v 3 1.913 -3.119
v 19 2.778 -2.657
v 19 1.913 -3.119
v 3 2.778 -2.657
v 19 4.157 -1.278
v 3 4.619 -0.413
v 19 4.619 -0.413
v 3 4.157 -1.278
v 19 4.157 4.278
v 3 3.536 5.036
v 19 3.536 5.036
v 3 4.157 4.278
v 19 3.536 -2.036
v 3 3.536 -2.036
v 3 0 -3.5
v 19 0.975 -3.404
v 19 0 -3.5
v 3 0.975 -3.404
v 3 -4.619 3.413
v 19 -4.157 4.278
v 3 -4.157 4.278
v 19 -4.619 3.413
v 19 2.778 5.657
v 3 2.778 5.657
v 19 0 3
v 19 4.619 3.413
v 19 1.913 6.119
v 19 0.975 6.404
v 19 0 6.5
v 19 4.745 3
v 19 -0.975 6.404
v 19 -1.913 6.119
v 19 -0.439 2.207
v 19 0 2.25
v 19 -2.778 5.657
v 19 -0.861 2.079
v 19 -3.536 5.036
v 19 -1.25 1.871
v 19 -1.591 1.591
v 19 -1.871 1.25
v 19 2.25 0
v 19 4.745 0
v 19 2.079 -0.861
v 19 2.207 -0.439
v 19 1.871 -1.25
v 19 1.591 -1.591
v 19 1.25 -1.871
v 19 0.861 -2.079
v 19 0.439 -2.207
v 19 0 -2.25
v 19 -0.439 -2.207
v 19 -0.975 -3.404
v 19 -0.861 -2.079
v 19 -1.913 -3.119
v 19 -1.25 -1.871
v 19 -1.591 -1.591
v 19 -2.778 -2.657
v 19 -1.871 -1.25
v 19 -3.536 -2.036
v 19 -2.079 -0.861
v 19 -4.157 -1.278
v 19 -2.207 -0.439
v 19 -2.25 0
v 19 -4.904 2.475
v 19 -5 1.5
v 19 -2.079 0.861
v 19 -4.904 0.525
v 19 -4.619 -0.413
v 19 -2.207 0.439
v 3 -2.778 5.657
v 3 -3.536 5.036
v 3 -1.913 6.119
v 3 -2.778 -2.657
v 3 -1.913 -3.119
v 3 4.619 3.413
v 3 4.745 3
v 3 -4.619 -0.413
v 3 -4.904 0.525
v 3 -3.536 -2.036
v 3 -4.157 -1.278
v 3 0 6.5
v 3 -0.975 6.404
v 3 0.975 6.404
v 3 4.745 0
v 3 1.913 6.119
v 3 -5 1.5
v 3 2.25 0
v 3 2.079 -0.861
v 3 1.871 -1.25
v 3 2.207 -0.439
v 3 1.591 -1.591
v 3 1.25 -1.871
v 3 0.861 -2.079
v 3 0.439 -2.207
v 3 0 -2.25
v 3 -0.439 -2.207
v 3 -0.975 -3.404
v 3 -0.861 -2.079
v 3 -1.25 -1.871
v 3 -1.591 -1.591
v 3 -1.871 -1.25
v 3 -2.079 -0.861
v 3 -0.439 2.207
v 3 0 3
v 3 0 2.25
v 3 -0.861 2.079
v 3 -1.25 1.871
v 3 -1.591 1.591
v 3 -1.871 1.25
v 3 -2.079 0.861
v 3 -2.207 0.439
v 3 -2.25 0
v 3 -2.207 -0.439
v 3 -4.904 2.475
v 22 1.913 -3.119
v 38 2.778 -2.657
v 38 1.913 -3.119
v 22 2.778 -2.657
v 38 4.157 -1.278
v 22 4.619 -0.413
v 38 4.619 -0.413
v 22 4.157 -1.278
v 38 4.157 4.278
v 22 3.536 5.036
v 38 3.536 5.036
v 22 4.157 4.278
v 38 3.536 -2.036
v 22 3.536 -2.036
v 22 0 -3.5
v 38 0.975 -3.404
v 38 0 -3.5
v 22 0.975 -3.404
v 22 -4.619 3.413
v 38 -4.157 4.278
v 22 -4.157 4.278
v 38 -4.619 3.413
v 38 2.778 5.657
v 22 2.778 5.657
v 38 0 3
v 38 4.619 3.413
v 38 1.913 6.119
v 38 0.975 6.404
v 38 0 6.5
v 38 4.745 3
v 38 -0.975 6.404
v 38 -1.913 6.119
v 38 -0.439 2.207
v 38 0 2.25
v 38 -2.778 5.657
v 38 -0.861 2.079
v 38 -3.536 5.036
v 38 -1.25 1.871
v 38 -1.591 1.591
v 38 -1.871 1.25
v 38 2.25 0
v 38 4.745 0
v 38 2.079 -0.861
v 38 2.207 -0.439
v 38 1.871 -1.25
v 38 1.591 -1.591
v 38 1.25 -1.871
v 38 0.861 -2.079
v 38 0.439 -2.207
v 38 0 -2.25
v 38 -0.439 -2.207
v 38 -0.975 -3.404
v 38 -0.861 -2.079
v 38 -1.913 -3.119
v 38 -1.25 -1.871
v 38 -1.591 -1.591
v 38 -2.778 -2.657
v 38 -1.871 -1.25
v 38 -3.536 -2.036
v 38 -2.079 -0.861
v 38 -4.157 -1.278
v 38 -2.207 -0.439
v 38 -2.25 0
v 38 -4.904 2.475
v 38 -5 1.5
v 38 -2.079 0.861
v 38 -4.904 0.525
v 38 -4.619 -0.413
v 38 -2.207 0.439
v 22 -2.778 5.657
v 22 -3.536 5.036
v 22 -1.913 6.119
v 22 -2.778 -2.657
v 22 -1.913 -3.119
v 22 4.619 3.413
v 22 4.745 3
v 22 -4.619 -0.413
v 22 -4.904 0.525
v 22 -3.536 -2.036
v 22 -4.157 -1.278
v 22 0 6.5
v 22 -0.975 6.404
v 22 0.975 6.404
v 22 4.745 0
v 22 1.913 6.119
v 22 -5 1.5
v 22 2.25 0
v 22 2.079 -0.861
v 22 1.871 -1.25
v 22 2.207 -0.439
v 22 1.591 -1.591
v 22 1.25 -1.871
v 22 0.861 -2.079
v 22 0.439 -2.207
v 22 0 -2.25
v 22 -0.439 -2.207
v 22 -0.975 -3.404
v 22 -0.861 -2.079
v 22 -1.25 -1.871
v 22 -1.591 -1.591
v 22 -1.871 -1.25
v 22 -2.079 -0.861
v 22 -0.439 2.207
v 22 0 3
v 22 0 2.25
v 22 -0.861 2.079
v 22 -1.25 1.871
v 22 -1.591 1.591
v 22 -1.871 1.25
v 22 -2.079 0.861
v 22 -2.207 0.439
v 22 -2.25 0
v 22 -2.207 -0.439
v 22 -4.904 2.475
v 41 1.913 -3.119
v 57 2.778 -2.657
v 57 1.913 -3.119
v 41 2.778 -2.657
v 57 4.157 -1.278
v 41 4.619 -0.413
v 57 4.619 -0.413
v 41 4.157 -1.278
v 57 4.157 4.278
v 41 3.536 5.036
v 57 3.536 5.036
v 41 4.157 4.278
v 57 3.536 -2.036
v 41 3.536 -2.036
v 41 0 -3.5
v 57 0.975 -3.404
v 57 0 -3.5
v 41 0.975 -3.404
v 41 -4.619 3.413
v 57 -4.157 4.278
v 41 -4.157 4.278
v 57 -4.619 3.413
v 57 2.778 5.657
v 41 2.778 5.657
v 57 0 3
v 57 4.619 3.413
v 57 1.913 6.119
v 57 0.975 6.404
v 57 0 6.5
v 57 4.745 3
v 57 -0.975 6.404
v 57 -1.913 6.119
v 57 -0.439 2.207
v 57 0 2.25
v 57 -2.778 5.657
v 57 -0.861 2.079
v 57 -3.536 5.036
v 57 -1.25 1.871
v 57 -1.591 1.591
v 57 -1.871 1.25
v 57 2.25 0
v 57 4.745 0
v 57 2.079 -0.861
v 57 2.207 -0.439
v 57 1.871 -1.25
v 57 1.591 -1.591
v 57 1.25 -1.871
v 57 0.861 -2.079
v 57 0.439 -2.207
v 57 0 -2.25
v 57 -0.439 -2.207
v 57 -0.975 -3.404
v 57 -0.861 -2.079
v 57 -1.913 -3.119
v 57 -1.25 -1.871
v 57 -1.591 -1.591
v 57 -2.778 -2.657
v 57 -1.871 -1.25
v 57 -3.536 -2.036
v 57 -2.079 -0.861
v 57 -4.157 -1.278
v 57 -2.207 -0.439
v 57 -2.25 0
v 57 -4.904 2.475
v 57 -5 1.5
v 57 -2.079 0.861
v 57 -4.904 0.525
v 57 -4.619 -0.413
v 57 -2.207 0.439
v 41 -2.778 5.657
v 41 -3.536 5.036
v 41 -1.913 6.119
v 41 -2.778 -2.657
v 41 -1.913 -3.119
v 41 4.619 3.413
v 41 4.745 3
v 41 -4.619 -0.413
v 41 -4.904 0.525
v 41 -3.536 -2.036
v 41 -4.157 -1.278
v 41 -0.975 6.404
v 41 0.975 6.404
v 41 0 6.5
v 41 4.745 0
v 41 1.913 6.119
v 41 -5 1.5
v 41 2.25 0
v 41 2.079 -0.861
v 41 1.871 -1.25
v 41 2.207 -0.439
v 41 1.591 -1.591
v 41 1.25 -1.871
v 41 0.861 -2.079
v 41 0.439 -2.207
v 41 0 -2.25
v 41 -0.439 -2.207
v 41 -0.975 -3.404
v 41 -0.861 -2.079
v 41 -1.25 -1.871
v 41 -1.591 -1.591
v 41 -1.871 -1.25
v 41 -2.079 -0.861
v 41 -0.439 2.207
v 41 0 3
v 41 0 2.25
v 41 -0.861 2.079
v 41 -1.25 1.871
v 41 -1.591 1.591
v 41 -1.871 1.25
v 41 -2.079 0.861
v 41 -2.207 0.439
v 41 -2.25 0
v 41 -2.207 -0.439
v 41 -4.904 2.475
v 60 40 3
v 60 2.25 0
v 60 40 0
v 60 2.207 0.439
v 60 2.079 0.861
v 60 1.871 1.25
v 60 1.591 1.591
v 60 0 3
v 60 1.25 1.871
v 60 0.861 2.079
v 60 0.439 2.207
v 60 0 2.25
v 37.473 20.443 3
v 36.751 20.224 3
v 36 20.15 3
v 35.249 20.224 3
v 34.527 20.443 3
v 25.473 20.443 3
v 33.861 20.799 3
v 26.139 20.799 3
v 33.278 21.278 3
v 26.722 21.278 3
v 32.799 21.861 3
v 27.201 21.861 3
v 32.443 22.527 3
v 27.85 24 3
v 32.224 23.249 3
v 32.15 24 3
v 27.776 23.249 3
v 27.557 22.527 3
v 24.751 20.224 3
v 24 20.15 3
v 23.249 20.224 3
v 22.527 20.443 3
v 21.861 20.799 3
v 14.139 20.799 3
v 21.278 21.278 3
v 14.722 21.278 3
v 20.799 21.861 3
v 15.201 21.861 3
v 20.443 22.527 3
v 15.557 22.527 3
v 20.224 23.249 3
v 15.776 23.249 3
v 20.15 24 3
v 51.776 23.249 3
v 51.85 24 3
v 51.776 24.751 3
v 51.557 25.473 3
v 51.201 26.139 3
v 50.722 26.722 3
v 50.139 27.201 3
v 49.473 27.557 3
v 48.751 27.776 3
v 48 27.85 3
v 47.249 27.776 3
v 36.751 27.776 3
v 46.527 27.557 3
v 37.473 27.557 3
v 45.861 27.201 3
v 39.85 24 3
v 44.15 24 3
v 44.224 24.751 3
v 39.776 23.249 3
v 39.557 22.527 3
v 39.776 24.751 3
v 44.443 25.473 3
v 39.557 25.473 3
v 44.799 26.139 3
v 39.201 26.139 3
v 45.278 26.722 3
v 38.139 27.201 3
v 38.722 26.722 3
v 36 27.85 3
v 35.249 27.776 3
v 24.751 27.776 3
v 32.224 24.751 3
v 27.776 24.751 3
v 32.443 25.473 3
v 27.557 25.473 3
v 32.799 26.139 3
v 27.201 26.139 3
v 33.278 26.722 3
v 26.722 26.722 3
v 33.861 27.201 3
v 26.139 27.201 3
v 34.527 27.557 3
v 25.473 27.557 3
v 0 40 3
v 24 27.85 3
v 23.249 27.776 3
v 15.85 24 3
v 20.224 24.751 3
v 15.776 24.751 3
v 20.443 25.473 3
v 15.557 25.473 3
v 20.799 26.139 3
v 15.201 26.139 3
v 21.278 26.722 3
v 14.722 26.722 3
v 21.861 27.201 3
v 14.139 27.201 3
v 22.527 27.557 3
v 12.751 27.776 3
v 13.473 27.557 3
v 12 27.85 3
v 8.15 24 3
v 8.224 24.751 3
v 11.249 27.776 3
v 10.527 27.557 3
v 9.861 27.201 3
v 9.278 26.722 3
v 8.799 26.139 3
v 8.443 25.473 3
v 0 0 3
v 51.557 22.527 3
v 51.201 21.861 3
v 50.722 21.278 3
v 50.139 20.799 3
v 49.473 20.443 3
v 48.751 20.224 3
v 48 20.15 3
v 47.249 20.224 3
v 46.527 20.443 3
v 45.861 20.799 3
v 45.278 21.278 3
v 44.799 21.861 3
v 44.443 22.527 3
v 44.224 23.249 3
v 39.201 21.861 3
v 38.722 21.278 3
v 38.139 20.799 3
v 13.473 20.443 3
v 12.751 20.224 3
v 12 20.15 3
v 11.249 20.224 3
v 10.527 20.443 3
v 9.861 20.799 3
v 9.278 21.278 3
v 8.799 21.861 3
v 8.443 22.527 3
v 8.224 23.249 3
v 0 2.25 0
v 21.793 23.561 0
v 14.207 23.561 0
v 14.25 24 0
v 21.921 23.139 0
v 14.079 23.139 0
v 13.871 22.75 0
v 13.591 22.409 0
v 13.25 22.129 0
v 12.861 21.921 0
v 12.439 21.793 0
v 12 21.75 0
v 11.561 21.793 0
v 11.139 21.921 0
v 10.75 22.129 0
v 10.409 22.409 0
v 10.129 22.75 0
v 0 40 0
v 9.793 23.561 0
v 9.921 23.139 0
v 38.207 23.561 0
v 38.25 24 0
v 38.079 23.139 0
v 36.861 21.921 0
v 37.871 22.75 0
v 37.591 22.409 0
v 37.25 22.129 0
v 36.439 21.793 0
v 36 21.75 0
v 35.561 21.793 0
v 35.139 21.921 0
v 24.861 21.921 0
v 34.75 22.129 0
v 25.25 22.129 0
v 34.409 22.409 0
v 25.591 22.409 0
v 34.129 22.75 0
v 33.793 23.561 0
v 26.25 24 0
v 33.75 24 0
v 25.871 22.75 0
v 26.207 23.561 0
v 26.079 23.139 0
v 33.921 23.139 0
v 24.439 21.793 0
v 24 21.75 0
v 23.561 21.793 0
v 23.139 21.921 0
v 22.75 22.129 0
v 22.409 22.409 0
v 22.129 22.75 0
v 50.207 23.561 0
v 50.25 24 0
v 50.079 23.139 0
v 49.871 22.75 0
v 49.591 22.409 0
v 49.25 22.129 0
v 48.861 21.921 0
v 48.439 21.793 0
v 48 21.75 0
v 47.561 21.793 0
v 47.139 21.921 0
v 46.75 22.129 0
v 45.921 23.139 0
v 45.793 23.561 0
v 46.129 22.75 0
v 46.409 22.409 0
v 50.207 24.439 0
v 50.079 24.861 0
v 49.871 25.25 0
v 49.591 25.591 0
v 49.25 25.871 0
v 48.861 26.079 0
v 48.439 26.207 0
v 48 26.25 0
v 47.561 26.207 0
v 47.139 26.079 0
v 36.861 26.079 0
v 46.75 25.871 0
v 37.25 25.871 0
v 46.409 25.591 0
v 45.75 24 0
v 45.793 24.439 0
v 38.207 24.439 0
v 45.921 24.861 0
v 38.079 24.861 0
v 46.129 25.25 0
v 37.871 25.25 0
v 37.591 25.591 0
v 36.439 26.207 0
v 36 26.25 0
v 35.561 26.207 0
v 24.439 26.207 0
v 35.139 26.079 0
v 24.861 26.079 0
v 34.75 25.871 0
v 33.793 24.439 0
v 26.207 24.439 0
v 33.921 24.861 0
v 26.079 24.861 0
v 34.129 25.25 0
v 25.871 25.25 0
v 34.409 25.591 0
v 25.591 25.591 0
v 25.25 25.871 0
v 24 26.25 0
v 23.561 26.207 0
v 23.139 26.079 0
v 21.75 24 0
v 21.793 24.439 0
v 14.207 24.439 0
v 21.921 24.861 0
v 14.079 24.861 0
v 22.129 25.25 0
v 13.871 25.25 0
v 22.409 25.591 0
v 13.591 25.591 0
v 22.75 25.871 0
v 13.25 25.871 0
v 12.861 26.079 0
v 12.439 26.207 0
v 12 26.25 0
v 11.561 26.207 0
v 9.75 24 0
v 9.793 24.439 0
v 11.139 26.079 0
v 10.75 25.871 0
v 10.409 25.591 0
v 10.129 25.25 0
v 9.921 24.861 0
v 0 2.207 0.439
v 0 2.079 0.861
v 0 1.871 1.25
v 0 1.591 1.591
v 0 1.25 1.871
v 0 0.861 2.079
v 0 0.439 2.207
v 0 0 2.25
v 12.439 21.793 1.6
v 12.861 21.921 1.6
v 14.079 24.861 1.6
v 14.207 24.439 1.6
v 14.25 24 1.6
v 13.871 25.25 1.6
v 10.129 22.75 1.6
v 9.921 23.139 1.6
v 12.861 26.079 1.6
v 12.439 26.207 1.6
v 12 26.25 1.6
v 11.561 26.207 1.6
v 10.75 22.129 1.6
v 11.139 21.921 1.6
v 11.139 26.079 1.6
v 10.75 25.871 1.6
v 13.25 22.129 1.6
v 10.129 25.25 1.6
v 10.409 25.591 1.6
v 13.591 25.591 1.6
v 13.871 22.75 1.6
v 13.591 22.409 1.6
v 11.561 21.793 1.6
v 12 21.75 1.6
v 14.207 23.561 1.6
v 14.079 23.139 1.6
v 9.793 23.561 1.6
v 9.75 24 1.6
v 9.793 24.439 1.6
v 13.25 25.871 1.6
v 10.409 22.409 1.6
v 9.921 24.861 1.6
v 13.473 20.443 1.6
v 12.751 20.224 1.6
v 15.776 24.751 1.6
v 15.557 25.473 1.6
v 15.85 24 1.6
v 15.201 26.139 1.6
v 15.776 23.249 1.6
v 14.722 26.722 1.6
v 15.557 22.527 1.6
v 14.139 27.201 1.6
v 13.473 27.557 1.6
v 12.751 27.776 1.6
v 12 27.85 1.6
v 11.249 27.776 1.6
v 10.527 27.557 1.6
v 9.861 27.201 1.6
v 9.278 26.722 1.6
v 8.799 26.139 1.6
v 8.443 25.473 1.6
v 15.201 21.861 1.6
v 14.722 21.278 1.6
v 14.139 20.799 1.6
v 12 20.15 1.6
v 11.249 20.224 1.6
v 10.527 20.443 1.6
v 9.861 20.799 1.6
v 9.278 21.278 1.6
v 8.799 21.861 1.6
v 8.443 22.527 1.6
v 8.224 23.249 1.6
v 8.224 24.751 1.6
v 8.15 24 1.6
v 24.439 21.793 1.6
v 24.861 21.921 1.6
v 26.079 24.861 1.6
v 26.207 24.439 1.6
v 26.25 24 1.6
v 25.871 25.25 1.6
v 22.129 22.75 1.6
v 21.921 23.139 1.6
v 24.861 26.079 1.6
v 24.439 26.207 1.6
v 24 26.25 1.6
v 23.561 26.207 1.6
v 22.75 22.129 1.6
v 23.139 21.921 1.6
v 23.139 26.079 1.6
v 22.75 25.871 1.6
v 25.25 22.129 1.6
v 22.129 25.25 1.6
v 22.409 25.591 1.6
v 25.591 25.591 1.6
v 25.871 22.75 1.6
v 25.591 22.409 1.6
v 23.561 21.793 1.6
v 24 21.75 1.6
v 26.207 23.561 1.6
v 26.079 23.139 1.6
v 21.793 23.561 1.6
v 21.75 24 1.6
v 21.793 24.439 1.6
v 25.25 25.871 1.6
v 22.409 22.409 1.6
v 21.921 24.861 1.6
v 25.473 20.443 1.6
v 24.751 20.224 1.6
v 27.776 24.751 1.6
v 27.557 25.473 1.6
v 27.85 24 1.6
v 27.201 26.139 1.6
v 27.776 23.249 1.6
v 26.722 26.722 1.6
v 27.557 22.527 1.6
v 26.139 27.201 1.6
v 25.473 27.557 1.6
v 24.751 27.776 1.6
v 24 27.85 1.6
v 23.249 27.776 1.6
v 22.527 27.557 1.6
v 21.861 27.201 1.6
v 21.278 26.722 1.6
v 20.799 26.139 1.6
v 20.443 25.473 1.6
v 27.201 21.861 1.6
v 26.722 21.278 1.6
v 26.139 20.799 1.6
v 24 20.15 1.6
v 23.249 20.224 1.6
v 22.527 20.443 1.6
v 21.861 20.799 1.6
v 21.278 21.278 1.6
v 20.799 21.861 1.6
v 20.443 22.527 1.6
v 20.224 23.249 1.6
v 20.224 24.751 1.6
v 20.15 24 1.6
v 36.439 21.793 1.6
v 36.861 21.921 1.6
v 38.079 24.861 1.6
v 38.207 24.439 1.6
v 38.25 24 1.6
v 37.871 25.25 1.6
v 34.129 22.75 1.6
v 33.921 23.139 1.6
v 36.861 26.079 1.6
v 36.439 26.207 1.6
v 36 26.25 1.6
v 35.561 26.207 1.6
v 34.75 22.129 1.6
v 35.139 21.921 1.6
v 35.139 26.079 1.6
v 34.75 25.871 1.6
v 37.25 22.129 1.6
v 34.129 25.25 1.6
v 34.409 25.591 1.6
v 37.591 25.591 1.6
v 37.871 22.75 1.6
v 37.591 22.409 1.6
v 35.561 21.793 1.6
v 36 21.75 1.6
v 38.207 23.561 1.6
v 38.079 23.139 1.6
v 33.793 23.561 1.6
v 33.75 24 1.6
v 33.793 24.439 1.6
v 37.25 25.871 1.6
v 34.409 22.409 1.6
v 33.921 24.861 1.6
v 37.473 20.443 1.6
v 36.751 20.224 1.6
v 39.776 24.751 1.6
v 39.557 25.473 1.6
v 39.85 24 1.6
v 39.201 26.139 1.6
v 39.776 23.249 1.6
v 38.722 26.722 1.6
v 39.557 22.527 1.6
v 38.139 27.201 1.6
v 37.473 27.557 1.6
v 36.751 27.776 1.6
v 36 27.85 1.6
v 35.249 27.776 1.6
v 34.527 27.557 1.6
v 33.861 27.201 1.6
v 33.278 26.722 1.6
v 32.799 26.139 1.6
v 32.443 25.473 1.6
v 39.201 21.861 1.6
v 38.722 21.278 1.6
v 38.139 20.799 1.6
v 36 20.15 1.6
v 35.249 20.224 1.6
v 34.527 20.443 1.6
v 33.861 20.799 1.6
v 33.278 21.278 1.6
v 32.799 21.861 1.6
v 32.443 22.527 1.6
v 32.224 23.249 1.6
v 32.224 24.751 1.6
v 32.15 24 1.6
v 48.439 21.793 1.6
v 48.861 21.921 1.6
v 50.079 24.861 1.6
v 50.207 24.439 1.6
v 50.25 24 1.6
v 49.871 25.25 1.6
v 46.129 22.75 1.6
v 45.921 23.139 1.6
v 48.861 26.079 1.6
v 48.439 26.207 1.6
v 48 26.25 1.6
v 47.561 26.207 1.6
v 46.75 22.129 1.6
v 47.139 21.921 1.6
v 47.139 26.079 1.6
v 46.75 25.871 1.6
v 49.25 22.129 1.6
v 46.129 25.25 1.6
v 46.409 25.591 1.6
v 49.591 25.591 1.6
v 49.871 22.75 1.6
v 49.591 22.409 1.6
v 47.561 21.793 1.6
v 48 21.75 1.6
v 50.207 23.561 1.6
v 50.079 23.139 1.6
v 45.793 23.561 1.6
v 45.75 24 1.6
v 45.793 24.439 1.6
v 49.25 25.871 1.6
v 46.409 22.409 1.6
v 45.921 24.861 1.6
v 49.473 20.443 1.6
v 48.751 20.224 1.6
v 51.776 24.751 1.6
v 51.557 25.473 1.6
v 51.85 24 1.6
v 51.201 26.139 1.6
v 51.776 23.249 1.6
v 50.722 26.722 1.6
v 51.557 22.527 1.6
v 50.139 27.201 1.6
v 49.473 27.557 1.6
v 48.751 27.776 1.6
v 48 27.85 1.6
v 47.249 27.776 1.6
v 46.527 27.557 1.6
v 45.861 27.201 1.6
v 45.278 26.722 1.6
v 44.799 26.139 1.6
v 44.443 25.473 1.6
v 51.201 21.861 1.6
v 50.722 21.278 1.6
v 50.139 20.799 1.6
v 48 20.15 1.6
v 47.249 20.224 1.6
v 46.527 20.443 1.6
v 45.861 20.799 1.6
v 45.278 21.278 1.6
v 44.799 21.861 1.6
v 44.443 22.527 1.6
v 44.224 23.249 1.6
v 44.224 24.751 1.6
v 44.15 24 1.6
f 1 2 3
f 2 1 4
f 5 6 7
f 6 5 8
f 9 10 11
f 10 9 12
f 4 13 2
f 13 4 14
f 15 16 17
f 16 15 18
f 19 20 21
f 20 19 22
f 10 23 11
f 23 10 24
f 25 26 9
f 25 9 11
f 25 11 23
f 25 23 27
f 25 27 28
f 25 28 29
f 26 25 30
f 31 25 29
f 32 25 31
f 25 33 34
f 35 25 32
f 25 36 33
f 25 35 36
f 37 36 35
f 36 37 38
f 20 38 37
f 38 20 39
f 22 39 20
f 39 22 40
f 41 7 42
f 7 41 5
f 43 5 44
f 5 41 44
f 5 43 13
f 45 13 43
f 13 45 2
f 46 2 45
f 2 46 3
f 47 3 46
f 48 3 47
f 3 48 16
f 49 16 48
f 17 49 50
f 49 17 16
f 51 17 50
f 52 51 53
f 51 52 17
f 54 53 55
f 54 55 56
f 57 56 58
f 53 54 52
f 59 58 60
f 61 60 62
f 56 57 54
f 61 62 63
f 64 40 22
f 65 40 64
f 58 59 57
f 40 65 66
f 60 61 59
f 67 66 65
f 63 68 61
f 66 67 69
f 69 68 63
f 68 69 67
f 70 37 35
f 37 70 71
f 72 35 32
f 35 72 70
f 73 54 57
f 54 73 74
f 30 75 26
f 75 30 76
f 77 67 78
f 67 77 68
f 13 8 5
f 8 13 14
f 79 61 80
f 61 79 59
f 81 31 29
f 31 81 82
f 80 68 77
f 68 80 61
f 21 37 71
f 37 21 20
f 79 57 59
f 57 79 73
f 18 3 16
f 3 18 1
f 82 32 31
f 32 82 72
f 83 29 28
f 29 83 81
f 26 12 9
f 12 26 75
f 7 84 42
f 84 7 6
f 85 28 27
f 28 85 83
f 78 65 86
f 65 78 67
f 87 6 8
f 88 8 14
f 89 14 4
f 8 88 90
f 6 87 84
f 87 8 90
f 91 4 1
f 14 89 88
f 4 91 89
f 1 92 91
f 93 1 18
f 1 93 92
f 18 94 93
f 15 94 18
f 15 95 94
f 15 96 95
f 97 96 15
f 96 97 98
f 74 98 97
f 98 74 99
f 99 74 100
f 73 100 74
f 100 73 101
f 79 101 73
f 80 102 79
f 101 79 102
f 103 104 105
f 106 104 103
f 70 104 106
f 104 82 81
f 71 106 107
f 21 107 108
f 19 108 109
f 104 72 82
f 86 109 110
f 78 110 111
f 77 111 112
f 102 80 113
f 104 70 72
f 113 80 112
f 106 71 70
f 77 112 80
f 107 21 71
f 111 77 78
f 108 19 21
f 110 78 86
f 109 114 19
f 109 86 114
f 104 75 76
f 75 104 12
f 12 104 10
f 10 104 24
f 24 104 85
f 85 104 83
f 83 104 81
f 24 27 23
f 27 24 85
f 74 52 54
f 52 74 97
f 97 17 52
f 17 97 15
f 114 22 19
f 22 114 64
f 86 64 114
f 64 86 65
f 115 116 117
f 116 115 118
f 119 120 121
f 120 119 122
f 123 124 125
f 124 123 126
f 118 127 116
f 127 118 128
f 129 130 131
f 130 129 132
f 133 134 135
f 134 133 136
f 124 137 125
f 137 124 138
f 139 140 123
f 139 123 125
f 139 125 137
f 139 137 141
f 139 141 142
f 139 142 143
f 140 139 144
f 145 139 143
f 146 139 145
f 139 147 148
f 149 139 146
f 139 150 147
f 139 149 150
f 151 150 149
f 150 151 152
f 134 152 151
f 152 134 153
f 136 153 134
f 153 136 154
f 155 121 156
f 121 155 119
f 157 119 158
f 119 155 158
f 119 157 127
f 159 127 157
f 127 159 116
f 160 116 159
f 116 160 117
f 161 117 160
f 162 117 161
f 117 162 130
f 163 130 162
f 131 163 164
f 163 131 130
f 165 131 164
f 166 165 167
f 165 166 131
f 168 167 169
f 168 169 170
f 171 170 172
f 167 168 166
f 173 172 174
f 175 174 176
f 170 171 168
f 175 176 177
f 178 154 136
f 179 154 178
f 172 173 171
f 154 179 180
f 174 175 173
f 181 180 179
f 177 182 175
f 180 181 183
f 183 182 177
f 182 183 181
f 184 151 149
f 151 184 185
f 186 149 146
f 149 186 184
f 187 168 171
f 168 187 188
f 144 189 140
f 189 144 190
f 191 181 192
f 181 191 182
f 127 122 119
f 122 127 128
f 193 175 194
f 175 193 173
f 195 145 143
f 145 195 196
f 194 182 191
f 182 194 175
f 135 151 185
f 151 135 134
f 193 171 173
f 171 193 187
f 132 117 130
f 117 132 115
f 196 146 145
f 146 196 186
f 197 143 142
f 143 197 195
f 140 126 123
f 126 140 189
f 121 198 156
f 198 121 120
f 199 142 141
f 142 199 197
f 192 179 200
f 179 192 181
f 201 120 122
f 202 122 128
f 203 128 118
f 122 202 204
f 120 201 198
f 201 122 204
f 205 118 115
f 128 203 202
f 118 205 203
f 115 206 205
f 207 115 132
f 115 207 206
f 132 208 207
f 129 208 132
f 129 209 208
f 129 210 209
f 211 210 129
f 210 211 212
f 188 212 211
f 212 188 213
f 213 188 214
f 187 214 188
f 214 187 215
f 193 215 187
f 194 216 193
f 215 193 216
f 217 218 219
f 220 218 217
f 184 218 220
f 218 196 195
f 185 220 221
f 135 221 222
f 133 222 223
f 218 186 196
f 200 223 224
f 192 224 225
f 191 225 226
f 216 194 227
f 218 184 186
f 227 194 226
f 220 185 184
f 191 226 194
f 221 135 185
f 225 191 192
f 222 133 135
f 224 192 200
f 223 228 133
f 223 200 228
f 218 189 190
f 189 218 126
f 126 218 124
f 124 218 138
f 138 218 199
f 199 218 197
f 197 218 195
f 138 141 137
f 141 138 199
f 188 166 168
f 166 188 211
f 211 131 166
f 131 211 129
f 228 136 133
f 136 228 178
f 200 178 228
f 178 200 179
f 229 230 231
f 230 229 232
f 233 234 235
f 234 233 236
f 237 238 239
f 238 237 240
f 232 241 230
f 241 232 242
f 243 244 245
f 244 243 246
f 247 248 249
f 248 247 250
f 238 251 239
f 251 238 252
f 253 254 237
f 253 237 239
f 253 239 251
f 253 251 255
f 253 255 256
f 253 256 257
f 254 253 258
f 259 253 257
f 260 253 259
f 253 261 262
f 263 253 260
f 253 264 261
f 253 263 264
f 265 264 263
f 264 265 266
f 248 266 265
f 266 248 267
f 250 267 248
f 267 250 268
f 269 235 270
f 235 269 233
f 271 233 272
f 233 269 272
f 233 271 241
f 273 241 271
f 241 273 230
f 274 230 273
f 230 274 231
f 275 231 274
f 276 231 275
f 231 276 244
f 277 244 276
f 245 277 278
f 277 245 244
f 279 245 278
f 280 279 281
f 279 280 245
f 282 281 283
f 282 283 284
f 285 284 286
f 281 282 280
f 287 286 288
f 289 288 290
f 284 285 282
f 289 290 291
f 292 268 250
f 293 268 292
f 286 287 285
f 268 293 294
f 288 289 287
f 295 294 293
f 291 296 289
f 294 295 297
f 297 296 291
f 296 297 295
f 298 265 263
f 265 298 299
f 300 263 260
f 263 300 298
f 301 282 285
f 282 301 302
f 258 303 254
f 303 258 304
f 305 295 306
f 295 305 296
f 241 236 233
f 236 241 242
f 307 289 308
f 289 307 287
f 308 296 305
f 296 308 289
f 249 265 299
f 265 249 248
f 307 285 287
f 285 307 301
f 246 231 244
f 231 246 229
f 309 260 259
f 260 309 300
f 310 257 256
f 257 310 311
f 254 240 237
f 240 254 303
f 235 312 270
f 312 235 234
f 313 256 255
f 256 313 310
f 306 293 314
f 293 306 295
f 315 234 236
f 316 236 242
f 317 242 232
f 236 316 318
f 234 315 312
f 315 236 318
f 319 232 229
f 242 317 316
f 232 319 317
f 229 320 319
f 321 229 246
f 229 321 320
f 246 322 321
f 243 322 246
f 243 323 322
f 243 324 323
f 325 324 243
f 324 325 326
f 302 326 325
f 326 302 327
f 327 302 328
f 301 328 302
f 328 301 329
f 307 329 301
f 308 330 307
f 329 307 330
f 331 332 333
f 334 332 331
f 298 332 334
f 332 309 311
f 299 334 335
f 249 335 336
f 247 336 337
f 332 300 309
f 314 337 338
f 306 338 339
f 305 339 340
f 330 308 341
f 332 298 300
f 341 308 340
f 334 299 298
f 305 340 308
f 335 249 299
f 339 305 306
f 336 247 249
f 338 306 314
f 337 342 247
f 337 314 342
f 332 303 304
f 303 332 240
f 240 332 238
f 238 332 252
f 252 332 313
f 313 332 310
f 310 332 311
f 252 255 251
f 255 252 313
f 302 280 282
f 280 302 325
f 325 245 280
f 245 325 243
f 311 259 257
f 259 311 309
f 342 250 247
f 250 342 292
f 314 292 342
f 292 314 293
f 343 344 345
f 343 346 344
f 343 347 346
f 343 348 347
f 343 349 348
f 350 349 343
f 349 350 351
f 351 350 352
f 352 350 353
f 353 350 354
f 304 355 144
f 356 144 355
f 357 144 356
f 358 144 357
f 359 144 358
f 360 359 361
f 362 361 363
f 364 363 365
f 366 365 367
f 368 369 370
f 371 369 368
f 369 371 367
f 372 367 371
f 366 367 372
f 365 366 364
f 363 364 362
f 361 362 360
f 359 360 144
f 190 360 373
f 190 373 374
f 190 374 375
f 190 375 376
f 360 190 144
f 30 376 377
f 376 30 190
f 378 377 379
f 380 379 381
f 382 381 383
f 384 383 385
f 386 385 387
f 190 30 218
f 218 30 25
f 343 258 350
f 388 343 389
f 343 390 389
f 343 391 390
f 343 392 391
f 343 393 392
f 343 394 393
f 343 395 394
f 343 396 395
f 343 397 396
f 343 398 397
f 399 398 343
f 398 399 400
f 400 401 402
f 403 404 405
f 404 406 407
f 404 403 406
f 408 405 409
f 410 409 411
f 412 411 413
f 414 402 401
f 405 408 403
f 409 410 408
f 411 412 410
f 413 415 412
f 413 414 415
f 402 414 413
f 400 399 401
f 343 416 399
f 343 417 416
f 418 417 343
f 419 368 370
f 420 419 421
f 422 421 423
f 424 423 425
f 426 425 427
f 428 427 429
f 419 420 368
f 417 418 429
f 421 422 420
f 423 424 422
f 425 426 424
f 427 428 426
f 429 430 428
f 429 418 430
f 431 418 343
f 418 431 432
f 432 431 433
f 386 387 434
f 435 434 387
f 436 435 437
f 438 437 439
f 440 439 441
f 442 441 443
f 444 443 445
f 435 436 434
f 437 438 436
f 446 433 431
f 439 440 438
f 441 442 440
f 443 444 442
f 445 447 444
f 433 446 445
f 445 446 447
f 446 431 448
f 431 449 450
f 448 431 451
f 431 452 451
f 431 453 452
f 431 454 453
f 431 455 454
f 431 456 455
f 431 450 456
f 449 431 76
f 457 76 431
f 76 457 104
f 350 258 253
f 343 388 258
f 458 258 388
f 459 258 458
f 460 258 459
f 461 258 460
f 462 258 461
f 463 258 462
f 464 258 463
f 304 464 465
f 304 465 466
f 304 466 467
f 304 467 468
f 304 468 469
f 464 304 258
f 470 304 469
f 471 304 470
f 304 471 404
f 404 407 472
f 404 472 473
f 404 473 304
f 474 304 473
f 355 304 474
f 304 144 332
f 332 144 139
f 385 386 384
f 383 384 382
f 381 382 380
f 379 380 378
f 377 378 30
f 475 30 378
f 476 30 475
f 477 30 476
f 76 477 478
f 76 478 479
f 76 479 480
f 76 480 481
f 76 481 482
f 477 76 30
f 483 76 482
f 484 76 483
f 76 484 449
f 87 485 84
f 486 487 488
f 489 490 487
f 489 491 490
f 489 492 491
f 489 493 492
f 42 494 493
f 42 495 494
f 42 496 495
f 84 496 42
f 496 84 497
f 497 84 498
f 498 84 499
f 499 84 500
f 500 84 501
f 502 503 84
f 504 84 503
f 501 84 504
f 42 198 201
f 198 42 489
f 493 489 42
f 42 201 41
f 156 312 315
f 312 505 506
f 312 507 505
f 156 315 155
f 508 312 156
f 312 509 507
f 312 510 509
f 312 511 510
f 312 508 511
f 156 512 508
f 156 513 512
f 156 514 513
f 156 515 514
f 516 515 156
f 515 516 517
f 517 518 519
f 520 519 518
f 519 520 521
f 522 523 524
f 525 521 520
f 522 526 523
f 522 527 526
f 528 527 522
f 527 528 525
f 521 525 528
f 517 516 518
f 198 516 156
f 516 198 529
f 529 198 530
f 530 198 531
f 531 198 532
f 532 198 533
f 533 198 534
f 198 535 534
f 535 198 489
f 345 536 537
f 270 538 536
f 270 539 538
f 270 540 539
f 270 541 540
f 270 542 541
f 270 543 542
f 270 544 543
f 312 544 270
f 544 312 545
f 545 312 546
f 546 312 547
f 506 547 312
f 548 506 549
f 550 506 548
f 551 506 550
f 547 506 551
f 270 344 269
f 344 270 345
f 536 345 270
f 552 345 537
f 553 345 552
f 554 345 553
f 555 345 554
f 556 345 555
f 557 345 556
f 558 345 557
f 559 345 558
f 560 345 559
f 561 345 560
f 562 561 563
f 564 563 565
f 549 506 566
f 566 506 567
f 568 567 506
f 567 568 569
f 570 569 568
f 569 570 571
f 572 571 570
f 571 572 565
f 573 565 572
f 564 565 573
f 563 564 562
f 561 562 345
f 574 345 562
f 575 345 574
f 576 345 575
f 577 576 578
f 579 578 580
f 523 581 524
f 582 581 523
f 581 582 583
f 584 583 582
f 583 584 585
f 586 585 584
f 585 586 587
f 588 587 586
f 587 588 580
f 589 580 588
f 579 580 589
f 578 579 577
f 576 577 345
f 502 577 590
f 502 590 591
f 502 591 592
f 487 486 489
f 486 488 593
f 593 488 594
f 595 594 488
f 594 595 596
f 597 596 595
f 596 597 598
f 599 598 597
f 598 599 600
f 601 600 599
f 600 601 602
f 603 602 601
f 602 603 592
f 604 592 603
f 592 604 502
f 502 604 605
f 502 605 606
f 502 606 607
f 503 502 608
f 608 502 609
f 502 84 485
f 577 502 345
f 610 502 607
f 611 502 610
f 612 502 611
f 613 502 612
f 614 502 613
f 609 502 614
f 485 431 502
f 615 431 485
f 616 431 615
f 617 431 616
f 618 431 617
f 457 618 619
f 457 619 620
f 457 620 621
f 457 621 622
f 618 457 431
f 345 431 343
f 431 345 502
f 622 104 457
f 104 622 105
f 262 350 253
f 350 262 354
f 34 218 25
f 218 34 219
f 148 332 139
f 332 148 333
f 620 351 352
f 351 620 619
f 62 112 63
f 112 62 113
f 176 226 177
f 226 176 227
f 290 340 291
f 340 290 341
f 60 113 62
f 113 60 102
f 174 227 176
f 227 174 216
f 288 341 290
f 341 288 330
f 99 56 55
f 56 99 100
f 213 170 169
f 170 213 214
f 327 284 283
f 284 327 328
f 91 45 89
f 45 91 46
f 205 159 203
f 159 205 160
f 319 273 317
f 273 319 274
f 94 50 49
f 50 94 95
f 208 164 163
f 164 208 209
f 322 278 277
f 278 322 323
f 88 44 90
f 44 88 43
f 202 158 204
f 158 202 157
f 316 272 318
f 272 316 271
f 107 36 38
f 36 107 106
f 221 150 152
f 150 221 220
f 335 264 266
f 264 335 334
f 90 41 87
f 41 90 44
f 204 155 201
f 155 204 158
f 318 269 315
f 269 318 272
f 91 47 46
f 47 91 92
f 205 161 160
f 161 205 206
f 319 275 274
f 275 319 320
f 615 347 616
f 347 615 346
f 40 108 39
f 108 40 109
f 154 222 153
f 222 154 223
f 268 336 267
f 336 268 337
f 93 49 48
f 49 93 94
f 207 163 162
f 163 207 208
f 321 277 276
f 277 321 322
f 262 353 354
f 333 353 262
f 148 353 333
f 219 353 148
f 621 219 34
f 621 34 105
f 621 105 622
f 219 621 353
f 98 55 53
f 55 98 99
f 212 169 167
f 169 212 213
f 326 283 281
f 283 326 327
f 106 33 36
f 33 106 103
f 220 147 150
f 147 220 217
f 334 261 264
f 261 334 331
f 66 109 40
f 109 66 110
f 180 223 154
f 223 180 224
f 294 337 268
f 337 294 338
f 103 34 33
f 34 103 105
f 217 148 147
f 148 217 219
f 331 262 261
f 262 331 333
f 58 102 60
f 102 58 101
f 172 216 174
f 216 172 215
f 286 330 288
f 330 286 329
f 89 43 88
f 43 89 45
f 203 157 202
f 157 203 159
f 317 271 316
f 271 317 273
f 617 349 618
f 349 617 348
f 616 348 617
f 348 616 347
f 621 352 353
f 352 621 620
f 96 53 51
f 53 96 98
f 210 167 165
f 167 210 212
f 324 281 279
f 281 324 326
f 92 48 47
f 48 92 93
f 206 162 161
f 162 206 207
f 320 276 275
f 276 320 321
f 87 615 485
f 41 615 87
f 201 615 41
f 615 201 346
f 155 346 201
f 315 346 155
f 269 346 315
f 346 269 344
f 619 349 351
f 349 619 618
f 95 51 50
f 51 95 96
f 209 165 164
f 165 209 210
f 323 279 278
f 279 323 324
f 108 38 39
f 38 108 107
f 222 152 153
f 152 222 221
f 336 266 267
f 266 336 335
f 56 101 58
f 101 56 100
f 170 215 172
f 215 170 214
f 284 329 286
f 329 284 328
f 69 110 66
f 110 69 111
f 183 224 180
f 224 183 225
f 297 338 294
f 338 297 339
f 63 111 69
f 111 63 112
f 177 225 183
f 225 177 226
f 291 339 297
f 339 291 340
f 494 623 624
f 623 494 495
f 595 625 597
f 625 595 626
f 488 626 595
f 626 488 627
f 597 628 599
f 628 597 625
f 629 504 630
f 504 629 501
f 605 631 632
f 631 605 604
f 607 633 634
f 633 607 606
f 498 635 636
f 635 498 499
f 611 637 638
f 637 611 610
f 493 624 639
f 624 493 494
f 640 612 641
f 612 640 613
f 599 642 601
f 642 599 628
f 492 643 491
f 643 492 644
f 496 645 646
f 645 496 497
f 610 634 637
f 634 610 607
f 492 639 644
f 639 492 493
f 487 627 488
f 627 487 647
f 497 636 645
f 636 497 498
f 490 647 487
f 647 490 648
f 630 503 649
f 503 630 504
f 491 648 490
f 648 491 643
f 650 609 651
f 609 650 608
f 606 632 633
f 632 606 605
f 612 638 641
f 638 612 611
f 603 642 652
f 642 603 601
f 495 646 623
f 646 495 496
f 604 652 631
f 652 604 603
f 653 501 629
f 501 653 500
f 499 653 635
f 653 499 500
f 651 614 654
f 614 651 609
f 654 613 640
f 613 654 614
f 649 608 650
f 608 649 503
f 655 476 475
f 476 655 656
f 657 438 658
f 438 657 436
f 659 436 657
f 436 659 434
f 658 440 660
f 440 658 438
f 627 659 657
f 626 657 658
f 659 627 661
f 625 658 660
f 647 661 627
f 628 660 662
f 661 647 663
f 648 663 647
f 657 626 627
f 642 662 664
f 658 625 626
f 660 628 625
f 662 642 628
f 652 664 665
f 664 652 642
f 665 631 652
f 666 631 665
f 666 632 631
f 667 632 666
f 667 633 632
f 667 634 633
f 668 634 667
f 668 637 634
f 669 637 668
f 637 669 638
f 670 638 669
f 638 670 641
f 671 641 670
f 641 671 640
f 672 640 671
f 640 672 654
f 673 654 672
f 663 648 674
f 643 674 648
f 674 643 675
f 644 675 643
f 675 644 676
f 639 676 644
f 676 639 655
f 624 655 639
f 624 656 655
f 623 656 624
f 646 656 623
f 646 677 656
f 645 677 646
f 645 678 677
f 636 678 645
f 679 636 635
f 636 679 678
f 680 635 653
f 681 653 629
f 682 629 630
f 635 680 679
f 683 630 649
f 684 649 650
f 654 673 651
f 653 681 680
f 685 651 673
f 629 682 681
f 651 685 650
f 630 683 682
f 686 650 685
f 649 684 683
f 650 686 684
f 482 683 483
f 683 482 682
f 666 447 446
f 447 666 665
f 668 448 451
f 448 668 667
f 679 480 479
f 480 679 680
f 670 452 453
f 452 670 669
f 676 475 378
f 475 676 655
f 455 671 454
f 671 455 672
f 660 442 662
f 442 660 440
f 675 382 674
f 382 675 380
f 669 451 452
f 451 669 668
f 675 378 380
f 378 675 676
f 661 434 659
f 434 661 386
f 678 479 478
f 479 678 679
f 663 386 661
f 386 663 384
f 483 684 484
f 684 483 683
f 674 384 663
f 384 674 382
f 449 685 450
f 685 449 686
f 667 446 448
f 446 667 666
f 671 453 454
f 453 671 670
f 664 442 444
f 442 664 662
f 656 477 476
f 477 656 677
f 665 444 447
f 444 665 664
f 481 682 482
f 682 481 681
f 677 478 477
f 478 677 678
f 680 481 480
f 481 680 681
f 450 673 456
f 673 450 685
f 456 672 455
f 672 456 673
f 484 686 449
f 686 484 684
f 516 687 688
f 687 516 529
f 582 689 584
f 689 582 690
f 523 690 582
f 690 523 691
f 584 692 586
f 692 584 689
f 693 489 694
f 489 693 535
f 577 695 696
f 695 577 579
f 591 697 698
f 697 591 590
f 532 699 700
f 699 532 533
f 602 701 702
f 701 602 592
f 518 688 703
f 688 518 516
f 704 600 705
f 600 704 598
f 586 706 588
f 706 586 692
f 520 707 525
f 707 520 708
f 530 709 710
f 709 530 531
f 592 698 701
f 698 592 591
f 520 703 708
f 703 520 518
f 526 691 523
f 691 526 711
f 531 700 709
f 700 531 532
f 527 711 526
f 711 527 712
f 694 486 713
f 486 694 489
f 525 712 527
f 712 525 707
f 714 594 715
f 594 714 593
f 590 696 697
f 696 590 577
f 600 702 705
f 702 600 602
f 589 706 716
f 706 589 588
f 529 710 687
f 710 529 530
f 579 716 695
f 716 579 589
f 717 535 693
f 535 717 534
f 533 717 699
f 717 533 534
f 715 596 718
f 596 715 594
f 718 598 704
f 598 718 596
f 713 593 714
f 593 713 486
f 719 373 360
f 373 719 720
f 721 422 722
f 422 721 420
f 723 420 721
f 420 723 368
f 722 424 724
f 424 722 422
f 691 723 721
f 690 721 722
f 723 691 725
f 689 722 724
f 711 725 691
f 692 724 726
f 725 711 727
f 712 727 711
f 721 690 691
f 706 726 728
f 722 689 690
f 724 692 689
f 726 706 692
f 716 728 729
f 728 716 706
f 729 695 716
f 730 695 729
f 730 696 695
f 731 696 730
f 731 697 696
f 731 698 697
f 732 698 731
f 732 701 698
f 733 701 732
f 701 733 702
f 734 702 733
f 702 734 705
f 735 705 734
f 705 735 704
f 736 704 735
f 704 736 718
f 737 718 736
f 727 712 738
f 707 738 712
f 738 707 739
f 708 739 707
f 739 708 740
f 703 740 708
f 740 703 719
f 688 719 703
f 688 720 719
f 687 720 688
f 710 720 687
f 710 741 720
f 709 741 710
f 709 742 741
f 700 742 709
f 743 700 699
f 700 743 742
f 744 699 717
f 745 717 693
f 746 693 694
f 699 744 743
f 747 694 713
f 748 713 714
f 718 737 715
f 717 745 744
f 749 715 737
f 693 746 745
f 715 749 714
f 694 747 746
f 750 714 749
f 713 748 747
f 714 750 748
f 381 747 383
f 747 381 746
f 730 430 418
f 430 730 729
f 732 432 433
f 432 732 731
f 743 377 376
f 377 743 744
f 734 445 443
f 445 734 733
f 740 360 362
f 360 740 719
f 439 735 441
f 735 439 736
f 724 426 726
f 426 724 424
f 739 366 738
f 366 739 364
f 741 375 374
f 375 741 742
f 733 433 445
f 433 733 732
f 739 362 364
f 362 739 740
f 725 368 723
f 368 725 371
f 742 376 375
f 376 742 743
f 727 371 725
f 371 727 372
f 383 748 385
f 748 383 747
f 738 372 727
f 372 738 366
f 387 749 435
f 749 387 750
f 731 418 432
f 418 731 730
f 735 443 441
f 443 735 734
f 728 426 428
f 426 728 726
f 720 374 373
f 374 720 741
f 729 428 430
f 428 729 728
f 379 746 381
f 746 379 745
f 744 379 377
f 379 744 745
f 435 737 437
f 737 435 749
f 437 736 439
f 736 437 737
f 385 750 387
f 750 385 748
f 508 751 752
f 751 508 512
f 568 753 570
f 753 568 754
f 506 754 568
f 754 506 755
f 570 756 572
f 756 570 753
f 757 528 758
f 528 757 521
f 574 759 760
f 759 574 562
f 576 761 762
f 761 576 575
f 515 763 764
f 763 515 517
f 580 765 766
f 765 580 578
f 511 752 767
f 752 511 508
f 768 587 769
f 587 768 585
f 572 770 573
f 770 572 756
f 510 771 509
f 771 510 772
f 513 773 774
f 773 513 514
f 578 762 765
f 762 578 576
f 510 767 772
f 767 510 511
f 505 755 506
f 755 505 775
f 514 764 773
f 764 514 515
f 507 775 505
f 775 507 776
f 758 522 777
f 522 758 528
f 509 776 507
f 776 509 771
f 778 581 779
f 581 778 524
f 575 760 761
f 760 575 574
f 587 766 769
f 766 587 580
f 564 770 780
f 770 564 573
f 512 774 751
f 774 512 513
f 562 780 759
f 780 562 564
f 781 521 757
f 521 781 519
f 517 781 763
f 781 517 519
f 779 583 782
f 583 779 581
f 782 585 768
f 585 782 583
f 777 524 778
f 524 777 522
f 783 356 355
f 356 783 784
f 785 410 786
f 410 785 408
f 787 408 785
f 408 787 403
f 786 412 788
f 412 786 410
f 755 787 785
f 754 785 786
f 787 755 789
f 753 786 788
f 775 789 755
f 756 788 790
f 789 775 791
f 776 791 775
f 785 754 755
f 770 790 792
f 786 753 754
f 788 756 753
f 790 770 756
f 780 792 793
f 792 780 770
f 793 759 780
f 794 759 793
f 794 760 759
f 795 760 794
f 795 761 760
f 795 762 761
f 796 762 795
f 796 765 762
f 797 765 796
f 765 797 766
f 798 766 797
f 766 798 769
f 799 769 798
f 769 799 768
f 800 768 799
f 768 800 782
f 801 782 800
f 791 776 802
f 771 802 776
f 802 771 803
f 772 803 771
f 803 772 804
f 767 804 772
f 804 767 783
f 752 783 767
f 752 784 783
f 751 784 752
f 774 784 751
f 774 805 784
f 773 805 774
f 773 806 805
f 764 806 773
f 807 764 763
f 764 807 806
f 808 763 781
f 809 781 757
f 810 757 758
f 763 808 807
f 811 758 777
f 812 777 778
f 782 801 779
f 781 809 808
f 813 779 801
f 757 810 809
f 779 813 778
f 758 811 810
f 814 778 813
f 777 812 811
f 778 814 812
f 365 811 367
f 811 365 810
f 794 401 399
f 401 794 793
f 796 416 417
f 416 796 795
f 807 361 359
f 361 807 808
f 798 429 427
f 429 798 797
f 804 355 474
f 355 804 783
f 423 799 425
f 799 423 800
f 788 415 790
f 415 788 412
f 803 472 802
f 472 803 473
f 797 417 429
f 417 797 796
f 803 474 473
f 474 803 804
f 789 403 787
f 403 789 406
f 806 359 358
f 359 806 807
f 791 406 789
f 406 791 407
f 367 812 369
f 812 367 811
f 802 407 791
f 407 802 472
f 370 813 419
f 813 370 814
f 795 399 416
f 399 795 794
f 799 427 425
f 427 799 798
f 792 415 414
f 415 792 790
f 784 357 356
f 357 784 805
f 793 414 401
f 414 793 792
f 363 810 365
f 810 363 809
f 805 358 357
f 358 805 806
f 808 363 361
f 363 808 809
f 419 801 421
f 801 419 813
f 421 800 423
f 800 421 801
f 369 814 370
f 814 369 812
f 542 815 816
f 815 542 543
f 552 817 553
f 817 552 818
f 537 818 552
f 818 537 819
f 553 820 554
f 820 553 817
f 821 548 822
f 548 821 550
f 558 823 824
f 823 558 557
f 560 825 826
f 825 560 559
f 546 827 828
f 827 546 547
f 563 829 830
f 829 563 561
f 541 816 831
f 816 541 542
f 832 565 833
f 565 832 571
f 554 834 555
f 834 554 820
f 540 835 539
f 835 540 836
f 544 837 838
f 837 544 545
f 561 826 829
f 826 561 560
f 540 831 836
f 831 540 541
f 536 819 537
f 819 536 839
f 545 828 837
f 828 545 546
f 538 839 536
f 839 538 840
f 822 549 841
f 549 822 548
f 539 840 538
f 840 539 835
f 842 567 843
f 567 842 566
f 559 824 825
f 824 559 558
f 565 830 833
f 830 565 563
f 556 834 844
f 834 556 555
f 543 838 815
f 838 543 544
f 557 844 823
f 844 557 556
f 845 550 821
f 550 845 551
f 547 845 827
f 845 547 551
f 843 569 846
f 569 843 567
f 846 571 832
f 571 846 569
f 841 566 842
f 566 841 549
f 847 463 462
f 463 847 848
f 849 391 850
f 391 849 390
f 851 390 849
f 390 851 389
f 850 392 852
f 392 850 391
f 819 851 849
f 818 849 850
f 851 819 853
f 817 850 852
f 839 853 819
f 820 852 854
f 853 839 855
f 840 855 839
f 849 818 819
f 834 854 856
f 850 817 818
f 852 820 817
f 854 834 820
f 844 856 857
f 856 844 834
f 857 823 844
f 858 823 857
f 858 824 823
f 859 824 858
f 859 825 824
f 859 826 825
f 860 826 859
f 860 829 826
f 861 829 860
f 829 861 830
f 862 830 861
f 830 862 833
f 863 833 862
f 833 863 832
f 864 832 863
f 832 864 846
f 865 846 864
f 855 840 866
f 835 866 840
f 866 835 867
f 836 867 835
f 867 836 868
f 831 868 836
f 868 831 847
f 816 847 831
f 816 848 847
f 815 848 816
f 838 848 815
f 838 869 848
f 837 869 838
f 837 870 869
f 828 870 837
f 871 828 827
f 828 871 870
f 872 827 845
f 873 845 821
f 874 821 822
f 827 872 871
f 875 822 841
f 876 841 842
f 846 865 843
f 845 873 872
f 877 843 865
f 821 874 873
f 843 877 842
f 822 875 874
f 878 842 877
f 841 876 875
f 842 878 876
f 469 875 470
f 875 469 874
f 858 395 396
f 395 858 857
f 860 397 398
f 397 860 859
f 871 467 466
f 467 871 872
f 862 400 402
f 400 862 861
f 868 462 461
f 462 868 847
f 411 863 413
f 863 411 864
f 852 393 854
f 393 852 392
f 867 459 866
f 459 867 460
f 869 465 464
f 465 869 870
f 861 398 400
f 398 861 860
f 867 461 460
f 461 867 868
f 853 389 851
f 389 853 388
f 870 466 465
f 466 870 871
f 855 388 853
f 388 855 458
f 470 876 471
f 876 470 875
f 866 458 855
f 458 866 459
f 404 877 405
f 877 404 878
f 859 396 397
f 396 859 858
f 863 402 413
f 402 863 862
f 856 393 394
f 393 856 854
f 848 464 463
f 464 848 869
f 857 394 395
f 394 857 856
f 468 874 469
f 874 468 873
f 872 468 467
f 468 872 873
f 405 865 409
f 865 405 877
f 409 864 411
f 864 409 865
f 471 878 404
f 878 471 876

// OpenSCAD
$fn = 32;

// ----------------------------------------------------------------------
// Hinge leaf: 60 x 45 x 10 mm
// ----------------------------------------------------------------------

// --- parameters (mm) ---
tab_len = 60;             // leaf length, X
tab_w = 40;               // leaf width, Y
tab_t = 3;                // leaf thickness
ring_d = 10;              // knuckle diameter
ring_w = 16;              // knuckle width
knuckle_n = 3;            // number of knuckles
pin_d = 4.5;              // pin bore
gap = 3;                  // gap between the knuckles
screw_d = 4.5;            // screw clearance
cs_d = 7.7;               // countersink diameter
cs_h = 1.4;               // countersink depth

module leaf() {
  cube([tab_len, tab_w, tab_t]);
}

module knuckles() {
  /* barrels sit on the leaf edge, the pin axis at half the leaf thickness */
  for (i = [0 : knuckle_n - 1])
    translate([gap + i * (ring_w + gap), 0, tab_t * 0.5])
      rotate([0, 90, 0]) cylinder(h = ring_w, d = ring_d);
}

difference() {
  union() {
    leaf();
    knuckles();
  }
  rotate([0, 90, 0]) translate([0, 0, -1])
    cylinder(h = tab_len + 2, d = pin_d);
  translate([12, tab_w * 0.6, -1]) cylinder(h = tab_t + 2, d = screw_d);
  translate([12, tab_w * 0.6, tab_t - cs_h]) cylinder(h = cs_h + 0.5, d = cs_d);
  translate([24, tab_w * 0.6, -1]) cylinder(h = tab_t + 2, d = screw_d);
  translate([24, tab_w * 0.6, tab_t - cs_h]) cylinder(h = cs_h + 0.5, d = cs_d);
  translate([36, tab_w * 0.6, -1]) cylinder(h = tab_t + 2, d = screw_d);
  translate([36, tab_w * 0.6, tab_t - cs_h]) cylinder(h = cs_h + 0.5, d = cs_d);
  translate([48, tab_w * 0.6, -1]) cylinder(h = tab_t + 2, d = screw_d);
  translate([48, tab_w * 0.6, tab_t - cs_h]) cylinder(h = cs_h + 0.5, d = cs_d);
}
